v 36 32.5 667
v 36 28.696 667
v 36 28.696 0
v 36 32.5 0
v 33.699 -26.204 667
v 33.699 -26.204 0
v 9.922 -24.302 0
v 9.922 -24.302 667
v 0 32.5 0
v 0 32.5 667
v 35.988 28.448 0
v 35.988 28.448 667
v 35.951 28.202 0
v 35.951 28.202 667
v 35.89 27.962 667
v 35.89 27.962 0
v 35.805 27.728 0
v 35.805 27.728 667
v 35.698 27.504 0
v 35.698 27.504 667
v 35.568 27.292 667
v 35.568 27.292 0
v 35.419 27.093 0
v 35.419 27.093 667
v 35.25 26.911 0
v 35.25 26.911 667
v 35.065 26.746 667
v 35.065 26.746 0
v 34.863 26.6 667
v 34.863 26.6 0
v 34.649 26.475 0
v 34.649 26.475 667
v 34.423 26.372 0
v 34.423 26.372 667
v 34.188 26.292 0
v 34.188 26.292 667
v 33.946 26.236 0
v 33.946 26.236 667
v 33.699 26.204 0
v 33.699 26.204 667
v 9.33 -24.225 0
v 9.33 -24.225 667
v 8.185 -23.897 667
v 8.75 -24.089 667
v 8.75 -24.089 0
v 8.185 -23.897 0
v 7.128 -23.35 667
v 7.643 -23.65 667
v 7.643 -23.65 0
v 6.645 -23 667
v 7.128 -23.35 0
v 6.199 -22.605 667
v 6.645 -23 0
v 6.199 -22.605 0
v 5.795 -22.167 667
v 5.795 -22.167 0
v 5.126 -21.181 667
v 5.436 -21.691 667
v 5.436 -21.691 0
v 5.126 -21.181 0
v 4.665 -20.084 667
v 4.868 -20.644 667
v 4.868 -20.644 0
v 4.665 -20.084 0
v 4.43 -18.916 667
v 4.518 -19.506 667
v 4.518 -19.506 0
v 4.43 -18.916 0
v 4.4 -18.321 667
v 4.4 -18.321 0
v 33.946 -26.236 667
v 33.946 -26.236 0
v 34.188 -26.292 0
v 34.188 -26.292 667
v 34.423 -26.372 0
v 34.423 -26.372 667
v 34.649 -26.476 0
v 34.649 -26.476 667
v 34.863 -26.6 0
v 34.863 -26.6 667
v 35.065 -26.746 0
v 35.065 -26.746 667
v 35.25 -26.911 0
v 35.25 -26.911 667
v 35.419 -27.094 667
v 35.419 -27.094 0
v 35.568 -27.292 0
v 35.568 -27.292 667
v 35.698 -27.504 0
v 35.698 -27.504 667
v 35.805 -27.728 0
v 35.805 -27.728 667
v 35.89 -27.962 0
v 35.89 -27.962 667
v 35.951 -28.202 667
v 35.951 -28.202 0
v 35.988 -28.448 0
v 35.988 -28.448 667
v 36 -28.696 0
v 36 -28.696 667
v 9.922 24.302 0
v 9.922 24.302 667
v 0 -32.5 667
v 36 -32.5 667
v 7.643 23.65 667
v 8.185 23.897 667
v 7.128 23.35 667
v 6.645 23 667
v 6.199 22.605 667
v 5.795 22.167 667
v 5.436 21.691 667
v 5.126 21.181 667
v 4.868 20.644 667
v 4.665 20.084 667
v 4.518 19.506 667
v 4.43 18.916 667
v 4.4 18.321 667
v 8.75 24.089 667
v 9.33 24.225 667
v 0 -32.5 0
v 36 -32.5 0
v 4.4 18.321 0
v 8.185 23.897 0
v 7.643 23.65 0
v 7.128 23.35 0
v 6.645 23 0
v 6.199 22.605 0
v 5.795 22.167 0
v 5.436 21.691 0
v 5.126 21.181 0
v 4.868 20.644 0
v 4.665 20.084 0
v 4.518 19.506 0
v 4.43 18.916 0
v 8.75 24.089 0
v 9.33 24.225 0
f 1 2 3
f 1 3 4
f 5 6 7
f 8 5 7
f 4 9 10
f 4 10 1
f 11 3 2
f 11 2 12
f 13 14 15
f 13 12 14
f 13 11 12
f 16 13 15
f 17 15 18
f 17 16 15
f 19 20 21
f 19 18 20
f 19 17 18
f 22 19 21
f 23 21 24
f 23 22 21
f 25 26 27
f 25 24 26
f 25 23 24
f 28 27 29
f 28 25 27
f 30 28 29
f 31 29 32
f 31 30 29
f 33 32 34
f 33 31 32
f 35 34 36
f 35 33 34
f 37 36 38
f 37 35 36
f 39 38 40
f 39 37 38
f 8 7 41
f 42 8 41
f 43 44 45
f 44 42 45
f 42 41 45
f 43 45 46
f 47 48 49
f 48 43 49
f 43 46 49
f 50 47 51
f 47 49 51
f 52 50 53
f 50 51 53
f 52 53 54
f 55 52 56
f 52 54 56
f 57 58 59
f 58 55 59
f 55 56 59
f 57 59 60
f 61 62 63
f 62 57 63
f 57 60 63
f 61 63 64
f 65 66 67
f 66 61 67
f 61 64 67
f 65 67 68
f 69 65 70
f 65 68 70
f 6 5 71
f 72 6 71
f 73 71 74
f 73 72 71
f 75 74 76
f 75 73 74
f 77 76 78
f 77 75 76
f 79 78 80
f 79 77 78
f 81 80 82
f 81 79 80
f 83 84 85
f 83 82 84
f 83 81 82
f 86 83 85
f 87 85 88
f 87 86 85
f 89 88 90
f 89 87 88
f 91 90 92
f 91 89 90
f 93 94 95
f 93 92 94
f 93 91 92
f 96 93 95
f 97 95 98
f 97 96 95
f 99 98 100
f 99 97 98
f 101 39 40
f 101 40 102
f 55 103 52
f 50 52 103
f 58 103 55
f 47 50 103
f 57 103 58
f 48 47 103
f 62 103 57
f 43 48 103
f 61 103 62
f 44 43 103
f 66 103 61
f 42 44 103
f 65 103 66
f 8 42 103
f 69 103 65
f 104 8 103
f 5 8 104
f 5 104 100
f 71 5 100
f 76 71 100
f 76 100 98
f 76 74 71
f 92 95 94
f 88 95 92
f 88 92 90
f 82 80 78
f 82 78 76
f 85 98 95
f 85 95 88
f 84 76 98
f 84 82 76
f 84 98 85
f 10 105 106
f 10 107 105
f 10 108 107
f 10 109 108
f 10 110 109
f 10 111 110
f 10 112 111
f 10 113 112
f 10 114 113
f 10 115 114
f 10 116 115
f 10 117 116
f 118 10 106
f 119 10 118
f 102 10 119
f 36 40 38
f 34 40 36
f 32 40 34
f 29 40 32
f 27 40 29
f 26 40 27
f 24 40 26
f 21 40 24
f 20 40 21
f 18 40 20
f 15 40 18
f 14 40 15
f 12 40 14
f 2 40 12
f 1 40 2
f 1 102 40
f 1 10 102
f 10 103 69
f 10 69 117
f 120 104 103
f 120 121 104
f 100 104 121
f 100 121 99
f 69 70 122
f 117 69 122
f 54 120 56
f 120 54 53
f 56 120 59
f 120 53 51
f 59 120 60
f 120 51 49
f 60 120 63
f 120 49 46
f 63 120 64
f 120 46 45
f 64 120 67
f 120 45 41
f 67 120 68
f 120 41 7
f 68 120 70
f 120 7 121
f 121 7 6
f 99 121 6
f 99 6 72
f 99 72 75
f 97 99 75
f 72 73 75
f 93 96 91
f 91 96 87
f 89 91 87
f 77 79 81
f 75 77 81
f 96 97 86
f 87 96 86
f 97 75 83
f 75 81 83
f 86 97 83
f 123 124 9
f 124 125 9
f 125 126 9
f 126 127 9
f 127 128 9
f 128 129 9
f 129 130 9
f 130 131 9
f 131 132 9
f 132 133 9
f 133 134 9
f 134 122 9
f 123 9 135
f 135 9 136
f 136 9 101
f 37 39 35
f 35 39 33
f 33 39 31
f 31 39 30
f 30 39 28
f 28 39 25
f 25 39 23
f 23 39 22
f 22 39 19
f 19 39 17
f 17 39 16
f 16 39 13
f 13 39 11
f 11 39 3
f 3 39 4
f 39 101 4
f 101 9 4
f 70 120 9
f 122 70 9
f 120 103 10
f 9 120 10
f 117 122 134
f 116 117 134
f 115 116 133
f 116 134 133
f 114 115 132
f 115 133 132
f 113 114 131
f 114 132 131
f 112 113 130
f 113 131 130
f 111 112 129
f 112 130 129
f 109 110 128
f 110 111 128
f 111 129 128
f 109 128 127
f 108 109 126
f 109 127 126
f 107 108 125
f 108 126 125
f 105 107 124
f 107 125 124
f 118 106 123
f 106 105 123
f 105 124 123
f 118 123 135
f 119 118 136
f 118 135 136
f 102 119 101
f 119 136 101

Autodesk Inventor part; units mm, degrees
ref_plane "YZ Plane" through (0, 0, 0) normal (1, 0, 0) x (0, 1, 0)
ref_plane "Начальная плоскость" through (0, 0, 0) normal (0, 0, 1) x (1, 0, 0)
ref_plane "Конечная плоскость" through (0, 0, 667) normal (0, 0, 1) x (1, 0, 0)
sketch "Эскиз" plane through (0, 0, 0) normal (0, 0, 1) x (1, 0, 0)
  line L0 (36, -32.5) -> (0, -32.5)
  line L1 (36, -32.5) -> (36, -28.696)
  line L2 (33.6994, -26.2039) -> (9.9215, -24.3017)
  line L3 (4.4, -18.3208) -> (4.4, 18.3208)
  line L4 (33.6994, 26.2039) -> (9.9215, 24.3017)
  line L5 (36, 28.696) -> (36, 32.5)
  line L6 (0, 32.5) -> (36, 32.5)
  line L7 (0, -32.5) -> (0, 32.5)
  arc A0 (4.4, -18.3208) -> (9.9215, -24.3017) centre (10.4, -18.3208) ccw
  arc A1 (9.9215, 24.3017) -> (4.4, 18.3208) centre (10.4, 18.3208) ccw
  arc A2 (36, -28.696) -> (33.6994, -26.2039) centre (33.5, -28.696) ccw
  arc A3 (33.6994, 26.2039) -> (36, 28.696) centre (33.5, 28.696) ccw
  line L8 (0, 45.5) -> (0, -45.5) construction
  line L9 (-7.2974, 0) -> (43.7847, 0) construction
  point P0 (36, -26.388)
  point P1 (4.4, -23.86)
  point P2 (4.4, 23.86)
  point P3 (36, 26.388)
  dimension "d3" = 36
  dimension "d5" = 4.4
  dimension "d7" = 65
  dimension "d9" = 8.64
  dimension "d11" = 8.64
  dimension "d13" = 6.112
  dimension "d15" = 6.112
  dimension "d22" = 6
  dimension "d23" = 2.5
  dimension "d24" = 32.5
  dimension "d25" = 0
extrude "Тело" add sketch "Эскиз" along normal up to surface (667 mm away) from surface at 0
sketch "Sketch3" plane through (0, 0, 0) normal (0, 0, 1) x (1, 0, 0)
  line L0 (0, 0) -> (10, 0)
ref_plane "Work Plane7" through (0, 0, 0) normal (0, -1, 0) x (1, 0, 0)
sketch "Sketch4" plane through (0, 0, 0) normal (0, -1, 0) x (1, 0, 0)
  line L0 (-2, 0) -> (12, 0)
  line L1 (-2, 667) -> (12, 667)
  dimension "d29" = 667
equation "\"d3\" = b"
equation "\"d5\" = t1"
equation "\"d7\" = ParH"
equation "\"d9\" = msp_x1 + t2"
equation "\"d11\" = msp_x1 + t2"
equation "\"d13\" = -msp_x2 + t2"
equation "\"d15\" = -msp_x2 + t2"
equation "\"d22\" = R"
equation "\"d23\" = R1"
equation "\"d24\" = 0.5 * d7"
equation "\"d16\" = G_L"
equation "\"R1\" = 2.5"
equation "\"R\" = 6"
equation "\"t1\" = 4.4"
equation "\"t2\" = 7.2"
equation "\"ParH\" = 65"
equation "\"b\" = 36"
equation "\"msp_x1\" = 0.04 * b"
equation "\"msp_x2\" = -0.08 * t1 + 0.04 * b"
equation "\"G_L\" = d29"
equation "\"ex\" = 0"
equation "\"G_OFFSET_START\" = 0"
equation "\"G_OFFSET_END\" = 0"
equation "\"d27\" = G_OFFSET_END + B_L"
equation "\"B_L\" = 667"
properties part number "Швеллер 6.5U-667 ГОСТ 8240-97" material "Сталь, мягкая"
